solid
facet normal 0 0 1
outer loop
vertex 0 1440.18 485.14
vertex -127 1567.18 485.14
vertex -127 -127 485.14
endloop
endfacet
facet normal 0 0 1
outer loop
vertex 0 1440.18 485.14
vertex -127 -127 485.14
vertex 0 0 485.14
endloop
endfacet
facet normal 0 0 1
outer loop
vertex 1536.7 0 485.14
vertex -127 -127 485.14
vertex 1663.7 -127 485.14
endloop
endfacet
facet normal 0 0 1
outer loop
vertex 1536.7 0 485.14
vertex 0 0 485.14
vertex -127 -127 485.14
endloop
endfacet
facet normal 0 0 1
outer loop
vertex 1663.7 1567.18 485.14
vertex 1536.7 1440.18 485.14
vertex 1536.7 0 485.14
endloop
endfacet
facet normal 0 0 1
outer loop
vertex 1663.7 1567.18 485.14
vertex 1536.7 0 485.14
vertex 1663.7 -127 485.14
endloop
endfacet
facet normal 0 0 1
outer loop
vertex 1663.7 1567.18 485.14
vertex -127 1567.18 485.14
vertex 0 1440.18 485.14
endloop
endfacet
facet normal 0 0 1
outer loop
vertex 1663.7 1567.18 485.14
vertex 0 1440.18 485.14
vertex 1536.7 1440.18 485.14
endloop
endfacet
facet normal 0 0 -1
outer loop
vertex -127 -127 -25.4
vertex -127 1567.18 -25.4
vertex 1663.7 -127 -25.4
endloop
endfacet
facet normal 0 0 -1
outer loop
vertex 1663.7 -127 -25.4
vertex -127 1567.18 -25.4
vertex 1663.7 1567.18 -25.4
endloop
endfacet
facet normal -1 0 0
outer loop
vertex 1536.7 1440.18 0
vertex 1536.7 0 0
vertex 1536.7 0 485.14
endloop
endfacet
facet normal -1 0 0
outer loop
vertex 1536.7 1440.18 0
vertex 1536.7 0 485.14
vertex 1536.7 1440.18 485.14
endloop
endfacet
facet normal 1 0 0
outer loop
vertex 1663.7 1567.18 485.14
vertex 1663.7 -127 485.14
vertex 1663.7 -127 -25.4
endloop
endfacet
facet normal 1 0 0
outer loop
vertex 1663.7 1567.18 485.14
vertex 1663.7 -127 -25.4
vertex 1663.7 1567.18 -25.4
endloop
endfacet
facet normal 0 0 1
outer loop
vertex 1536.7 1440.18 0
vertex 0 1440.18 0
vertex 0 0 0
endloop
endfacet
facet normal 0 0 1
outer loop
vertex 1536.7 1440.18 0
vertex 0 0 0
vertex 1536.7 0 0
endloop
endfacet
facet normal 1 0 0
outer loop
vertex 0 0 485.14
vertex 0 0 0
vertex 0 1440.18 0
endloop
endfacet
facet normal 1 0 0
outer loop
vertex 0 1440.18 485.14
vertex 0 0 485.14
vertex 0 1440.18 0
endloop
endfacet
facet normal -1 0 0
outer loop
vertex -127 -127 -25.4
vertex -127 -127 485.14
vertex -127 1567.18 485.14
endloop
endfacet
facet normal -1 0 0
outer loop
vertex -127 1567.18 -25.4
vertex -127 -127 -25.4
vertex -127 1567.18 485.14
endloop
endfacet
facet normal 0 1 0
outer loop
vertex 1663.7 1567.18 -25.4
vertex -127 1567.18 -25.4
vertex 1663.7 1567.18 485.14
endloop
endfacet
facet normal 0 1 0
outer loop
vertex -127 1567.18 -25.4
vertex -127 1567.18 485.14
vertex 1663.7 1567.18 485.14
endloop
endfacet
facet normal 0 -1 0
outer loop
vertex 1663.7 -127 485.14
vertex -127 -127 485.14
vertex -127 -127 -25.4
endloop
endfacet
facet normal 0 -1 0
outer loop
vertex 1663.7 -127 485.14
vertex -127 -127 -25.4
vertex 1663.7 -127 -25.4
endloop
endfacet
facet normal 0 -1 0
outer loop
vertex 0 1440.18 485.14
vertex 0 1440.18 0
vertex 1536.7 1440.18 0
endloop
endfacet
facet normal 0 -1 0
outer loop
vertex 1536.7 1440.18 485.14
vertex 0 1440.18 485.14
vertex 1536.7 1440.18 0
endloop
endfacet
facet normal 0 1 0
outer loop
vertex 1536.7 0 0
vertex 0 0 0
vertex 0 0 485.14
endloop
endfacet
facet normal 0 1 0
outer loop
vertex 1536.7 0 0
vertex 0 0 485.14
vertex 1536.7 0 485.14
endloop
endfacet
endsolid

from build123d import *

# Parameters (mm, degrees)
F0_W     = 1790.7
F0_H     = 1694.18
F0_W_2   = 1536.7
F0_H_2   = 1440.18
F1_DEPTH = 485.14
F2_DEPTH = 25.4


with BuildPart() as f1:
    # F0 (on Top) → F1 (new body)
    with BuildSketch(Plane.XY):
        with Locations((768.35, 720.09)):
            Rectangle(F0_W, F0_H)
        with Locations((768.35, 720.09)):
            Rectangle(F0_W_2, F0_H_2, mode=Mode.SUBTRACT)
    extrude(amount=F1_DEPTH)

    # F0 (on Top) → F2 (join)
    with BuildSketch(Plane.XY):
        with Locations((768.35, 720.09)):
            Rectangle(F0_W, F0_H)
        with Locations((768.35, 720.09)):
            Rectangle(F0_W_2, F0_H_2, mode=Mode.SUBTRACT)
        with Locations((768.35, 720.09)):
            Rectangle(F0_W_2, F0_H_2)
    extrude(amount=-F2_DEPTH)


solid = f1.part
